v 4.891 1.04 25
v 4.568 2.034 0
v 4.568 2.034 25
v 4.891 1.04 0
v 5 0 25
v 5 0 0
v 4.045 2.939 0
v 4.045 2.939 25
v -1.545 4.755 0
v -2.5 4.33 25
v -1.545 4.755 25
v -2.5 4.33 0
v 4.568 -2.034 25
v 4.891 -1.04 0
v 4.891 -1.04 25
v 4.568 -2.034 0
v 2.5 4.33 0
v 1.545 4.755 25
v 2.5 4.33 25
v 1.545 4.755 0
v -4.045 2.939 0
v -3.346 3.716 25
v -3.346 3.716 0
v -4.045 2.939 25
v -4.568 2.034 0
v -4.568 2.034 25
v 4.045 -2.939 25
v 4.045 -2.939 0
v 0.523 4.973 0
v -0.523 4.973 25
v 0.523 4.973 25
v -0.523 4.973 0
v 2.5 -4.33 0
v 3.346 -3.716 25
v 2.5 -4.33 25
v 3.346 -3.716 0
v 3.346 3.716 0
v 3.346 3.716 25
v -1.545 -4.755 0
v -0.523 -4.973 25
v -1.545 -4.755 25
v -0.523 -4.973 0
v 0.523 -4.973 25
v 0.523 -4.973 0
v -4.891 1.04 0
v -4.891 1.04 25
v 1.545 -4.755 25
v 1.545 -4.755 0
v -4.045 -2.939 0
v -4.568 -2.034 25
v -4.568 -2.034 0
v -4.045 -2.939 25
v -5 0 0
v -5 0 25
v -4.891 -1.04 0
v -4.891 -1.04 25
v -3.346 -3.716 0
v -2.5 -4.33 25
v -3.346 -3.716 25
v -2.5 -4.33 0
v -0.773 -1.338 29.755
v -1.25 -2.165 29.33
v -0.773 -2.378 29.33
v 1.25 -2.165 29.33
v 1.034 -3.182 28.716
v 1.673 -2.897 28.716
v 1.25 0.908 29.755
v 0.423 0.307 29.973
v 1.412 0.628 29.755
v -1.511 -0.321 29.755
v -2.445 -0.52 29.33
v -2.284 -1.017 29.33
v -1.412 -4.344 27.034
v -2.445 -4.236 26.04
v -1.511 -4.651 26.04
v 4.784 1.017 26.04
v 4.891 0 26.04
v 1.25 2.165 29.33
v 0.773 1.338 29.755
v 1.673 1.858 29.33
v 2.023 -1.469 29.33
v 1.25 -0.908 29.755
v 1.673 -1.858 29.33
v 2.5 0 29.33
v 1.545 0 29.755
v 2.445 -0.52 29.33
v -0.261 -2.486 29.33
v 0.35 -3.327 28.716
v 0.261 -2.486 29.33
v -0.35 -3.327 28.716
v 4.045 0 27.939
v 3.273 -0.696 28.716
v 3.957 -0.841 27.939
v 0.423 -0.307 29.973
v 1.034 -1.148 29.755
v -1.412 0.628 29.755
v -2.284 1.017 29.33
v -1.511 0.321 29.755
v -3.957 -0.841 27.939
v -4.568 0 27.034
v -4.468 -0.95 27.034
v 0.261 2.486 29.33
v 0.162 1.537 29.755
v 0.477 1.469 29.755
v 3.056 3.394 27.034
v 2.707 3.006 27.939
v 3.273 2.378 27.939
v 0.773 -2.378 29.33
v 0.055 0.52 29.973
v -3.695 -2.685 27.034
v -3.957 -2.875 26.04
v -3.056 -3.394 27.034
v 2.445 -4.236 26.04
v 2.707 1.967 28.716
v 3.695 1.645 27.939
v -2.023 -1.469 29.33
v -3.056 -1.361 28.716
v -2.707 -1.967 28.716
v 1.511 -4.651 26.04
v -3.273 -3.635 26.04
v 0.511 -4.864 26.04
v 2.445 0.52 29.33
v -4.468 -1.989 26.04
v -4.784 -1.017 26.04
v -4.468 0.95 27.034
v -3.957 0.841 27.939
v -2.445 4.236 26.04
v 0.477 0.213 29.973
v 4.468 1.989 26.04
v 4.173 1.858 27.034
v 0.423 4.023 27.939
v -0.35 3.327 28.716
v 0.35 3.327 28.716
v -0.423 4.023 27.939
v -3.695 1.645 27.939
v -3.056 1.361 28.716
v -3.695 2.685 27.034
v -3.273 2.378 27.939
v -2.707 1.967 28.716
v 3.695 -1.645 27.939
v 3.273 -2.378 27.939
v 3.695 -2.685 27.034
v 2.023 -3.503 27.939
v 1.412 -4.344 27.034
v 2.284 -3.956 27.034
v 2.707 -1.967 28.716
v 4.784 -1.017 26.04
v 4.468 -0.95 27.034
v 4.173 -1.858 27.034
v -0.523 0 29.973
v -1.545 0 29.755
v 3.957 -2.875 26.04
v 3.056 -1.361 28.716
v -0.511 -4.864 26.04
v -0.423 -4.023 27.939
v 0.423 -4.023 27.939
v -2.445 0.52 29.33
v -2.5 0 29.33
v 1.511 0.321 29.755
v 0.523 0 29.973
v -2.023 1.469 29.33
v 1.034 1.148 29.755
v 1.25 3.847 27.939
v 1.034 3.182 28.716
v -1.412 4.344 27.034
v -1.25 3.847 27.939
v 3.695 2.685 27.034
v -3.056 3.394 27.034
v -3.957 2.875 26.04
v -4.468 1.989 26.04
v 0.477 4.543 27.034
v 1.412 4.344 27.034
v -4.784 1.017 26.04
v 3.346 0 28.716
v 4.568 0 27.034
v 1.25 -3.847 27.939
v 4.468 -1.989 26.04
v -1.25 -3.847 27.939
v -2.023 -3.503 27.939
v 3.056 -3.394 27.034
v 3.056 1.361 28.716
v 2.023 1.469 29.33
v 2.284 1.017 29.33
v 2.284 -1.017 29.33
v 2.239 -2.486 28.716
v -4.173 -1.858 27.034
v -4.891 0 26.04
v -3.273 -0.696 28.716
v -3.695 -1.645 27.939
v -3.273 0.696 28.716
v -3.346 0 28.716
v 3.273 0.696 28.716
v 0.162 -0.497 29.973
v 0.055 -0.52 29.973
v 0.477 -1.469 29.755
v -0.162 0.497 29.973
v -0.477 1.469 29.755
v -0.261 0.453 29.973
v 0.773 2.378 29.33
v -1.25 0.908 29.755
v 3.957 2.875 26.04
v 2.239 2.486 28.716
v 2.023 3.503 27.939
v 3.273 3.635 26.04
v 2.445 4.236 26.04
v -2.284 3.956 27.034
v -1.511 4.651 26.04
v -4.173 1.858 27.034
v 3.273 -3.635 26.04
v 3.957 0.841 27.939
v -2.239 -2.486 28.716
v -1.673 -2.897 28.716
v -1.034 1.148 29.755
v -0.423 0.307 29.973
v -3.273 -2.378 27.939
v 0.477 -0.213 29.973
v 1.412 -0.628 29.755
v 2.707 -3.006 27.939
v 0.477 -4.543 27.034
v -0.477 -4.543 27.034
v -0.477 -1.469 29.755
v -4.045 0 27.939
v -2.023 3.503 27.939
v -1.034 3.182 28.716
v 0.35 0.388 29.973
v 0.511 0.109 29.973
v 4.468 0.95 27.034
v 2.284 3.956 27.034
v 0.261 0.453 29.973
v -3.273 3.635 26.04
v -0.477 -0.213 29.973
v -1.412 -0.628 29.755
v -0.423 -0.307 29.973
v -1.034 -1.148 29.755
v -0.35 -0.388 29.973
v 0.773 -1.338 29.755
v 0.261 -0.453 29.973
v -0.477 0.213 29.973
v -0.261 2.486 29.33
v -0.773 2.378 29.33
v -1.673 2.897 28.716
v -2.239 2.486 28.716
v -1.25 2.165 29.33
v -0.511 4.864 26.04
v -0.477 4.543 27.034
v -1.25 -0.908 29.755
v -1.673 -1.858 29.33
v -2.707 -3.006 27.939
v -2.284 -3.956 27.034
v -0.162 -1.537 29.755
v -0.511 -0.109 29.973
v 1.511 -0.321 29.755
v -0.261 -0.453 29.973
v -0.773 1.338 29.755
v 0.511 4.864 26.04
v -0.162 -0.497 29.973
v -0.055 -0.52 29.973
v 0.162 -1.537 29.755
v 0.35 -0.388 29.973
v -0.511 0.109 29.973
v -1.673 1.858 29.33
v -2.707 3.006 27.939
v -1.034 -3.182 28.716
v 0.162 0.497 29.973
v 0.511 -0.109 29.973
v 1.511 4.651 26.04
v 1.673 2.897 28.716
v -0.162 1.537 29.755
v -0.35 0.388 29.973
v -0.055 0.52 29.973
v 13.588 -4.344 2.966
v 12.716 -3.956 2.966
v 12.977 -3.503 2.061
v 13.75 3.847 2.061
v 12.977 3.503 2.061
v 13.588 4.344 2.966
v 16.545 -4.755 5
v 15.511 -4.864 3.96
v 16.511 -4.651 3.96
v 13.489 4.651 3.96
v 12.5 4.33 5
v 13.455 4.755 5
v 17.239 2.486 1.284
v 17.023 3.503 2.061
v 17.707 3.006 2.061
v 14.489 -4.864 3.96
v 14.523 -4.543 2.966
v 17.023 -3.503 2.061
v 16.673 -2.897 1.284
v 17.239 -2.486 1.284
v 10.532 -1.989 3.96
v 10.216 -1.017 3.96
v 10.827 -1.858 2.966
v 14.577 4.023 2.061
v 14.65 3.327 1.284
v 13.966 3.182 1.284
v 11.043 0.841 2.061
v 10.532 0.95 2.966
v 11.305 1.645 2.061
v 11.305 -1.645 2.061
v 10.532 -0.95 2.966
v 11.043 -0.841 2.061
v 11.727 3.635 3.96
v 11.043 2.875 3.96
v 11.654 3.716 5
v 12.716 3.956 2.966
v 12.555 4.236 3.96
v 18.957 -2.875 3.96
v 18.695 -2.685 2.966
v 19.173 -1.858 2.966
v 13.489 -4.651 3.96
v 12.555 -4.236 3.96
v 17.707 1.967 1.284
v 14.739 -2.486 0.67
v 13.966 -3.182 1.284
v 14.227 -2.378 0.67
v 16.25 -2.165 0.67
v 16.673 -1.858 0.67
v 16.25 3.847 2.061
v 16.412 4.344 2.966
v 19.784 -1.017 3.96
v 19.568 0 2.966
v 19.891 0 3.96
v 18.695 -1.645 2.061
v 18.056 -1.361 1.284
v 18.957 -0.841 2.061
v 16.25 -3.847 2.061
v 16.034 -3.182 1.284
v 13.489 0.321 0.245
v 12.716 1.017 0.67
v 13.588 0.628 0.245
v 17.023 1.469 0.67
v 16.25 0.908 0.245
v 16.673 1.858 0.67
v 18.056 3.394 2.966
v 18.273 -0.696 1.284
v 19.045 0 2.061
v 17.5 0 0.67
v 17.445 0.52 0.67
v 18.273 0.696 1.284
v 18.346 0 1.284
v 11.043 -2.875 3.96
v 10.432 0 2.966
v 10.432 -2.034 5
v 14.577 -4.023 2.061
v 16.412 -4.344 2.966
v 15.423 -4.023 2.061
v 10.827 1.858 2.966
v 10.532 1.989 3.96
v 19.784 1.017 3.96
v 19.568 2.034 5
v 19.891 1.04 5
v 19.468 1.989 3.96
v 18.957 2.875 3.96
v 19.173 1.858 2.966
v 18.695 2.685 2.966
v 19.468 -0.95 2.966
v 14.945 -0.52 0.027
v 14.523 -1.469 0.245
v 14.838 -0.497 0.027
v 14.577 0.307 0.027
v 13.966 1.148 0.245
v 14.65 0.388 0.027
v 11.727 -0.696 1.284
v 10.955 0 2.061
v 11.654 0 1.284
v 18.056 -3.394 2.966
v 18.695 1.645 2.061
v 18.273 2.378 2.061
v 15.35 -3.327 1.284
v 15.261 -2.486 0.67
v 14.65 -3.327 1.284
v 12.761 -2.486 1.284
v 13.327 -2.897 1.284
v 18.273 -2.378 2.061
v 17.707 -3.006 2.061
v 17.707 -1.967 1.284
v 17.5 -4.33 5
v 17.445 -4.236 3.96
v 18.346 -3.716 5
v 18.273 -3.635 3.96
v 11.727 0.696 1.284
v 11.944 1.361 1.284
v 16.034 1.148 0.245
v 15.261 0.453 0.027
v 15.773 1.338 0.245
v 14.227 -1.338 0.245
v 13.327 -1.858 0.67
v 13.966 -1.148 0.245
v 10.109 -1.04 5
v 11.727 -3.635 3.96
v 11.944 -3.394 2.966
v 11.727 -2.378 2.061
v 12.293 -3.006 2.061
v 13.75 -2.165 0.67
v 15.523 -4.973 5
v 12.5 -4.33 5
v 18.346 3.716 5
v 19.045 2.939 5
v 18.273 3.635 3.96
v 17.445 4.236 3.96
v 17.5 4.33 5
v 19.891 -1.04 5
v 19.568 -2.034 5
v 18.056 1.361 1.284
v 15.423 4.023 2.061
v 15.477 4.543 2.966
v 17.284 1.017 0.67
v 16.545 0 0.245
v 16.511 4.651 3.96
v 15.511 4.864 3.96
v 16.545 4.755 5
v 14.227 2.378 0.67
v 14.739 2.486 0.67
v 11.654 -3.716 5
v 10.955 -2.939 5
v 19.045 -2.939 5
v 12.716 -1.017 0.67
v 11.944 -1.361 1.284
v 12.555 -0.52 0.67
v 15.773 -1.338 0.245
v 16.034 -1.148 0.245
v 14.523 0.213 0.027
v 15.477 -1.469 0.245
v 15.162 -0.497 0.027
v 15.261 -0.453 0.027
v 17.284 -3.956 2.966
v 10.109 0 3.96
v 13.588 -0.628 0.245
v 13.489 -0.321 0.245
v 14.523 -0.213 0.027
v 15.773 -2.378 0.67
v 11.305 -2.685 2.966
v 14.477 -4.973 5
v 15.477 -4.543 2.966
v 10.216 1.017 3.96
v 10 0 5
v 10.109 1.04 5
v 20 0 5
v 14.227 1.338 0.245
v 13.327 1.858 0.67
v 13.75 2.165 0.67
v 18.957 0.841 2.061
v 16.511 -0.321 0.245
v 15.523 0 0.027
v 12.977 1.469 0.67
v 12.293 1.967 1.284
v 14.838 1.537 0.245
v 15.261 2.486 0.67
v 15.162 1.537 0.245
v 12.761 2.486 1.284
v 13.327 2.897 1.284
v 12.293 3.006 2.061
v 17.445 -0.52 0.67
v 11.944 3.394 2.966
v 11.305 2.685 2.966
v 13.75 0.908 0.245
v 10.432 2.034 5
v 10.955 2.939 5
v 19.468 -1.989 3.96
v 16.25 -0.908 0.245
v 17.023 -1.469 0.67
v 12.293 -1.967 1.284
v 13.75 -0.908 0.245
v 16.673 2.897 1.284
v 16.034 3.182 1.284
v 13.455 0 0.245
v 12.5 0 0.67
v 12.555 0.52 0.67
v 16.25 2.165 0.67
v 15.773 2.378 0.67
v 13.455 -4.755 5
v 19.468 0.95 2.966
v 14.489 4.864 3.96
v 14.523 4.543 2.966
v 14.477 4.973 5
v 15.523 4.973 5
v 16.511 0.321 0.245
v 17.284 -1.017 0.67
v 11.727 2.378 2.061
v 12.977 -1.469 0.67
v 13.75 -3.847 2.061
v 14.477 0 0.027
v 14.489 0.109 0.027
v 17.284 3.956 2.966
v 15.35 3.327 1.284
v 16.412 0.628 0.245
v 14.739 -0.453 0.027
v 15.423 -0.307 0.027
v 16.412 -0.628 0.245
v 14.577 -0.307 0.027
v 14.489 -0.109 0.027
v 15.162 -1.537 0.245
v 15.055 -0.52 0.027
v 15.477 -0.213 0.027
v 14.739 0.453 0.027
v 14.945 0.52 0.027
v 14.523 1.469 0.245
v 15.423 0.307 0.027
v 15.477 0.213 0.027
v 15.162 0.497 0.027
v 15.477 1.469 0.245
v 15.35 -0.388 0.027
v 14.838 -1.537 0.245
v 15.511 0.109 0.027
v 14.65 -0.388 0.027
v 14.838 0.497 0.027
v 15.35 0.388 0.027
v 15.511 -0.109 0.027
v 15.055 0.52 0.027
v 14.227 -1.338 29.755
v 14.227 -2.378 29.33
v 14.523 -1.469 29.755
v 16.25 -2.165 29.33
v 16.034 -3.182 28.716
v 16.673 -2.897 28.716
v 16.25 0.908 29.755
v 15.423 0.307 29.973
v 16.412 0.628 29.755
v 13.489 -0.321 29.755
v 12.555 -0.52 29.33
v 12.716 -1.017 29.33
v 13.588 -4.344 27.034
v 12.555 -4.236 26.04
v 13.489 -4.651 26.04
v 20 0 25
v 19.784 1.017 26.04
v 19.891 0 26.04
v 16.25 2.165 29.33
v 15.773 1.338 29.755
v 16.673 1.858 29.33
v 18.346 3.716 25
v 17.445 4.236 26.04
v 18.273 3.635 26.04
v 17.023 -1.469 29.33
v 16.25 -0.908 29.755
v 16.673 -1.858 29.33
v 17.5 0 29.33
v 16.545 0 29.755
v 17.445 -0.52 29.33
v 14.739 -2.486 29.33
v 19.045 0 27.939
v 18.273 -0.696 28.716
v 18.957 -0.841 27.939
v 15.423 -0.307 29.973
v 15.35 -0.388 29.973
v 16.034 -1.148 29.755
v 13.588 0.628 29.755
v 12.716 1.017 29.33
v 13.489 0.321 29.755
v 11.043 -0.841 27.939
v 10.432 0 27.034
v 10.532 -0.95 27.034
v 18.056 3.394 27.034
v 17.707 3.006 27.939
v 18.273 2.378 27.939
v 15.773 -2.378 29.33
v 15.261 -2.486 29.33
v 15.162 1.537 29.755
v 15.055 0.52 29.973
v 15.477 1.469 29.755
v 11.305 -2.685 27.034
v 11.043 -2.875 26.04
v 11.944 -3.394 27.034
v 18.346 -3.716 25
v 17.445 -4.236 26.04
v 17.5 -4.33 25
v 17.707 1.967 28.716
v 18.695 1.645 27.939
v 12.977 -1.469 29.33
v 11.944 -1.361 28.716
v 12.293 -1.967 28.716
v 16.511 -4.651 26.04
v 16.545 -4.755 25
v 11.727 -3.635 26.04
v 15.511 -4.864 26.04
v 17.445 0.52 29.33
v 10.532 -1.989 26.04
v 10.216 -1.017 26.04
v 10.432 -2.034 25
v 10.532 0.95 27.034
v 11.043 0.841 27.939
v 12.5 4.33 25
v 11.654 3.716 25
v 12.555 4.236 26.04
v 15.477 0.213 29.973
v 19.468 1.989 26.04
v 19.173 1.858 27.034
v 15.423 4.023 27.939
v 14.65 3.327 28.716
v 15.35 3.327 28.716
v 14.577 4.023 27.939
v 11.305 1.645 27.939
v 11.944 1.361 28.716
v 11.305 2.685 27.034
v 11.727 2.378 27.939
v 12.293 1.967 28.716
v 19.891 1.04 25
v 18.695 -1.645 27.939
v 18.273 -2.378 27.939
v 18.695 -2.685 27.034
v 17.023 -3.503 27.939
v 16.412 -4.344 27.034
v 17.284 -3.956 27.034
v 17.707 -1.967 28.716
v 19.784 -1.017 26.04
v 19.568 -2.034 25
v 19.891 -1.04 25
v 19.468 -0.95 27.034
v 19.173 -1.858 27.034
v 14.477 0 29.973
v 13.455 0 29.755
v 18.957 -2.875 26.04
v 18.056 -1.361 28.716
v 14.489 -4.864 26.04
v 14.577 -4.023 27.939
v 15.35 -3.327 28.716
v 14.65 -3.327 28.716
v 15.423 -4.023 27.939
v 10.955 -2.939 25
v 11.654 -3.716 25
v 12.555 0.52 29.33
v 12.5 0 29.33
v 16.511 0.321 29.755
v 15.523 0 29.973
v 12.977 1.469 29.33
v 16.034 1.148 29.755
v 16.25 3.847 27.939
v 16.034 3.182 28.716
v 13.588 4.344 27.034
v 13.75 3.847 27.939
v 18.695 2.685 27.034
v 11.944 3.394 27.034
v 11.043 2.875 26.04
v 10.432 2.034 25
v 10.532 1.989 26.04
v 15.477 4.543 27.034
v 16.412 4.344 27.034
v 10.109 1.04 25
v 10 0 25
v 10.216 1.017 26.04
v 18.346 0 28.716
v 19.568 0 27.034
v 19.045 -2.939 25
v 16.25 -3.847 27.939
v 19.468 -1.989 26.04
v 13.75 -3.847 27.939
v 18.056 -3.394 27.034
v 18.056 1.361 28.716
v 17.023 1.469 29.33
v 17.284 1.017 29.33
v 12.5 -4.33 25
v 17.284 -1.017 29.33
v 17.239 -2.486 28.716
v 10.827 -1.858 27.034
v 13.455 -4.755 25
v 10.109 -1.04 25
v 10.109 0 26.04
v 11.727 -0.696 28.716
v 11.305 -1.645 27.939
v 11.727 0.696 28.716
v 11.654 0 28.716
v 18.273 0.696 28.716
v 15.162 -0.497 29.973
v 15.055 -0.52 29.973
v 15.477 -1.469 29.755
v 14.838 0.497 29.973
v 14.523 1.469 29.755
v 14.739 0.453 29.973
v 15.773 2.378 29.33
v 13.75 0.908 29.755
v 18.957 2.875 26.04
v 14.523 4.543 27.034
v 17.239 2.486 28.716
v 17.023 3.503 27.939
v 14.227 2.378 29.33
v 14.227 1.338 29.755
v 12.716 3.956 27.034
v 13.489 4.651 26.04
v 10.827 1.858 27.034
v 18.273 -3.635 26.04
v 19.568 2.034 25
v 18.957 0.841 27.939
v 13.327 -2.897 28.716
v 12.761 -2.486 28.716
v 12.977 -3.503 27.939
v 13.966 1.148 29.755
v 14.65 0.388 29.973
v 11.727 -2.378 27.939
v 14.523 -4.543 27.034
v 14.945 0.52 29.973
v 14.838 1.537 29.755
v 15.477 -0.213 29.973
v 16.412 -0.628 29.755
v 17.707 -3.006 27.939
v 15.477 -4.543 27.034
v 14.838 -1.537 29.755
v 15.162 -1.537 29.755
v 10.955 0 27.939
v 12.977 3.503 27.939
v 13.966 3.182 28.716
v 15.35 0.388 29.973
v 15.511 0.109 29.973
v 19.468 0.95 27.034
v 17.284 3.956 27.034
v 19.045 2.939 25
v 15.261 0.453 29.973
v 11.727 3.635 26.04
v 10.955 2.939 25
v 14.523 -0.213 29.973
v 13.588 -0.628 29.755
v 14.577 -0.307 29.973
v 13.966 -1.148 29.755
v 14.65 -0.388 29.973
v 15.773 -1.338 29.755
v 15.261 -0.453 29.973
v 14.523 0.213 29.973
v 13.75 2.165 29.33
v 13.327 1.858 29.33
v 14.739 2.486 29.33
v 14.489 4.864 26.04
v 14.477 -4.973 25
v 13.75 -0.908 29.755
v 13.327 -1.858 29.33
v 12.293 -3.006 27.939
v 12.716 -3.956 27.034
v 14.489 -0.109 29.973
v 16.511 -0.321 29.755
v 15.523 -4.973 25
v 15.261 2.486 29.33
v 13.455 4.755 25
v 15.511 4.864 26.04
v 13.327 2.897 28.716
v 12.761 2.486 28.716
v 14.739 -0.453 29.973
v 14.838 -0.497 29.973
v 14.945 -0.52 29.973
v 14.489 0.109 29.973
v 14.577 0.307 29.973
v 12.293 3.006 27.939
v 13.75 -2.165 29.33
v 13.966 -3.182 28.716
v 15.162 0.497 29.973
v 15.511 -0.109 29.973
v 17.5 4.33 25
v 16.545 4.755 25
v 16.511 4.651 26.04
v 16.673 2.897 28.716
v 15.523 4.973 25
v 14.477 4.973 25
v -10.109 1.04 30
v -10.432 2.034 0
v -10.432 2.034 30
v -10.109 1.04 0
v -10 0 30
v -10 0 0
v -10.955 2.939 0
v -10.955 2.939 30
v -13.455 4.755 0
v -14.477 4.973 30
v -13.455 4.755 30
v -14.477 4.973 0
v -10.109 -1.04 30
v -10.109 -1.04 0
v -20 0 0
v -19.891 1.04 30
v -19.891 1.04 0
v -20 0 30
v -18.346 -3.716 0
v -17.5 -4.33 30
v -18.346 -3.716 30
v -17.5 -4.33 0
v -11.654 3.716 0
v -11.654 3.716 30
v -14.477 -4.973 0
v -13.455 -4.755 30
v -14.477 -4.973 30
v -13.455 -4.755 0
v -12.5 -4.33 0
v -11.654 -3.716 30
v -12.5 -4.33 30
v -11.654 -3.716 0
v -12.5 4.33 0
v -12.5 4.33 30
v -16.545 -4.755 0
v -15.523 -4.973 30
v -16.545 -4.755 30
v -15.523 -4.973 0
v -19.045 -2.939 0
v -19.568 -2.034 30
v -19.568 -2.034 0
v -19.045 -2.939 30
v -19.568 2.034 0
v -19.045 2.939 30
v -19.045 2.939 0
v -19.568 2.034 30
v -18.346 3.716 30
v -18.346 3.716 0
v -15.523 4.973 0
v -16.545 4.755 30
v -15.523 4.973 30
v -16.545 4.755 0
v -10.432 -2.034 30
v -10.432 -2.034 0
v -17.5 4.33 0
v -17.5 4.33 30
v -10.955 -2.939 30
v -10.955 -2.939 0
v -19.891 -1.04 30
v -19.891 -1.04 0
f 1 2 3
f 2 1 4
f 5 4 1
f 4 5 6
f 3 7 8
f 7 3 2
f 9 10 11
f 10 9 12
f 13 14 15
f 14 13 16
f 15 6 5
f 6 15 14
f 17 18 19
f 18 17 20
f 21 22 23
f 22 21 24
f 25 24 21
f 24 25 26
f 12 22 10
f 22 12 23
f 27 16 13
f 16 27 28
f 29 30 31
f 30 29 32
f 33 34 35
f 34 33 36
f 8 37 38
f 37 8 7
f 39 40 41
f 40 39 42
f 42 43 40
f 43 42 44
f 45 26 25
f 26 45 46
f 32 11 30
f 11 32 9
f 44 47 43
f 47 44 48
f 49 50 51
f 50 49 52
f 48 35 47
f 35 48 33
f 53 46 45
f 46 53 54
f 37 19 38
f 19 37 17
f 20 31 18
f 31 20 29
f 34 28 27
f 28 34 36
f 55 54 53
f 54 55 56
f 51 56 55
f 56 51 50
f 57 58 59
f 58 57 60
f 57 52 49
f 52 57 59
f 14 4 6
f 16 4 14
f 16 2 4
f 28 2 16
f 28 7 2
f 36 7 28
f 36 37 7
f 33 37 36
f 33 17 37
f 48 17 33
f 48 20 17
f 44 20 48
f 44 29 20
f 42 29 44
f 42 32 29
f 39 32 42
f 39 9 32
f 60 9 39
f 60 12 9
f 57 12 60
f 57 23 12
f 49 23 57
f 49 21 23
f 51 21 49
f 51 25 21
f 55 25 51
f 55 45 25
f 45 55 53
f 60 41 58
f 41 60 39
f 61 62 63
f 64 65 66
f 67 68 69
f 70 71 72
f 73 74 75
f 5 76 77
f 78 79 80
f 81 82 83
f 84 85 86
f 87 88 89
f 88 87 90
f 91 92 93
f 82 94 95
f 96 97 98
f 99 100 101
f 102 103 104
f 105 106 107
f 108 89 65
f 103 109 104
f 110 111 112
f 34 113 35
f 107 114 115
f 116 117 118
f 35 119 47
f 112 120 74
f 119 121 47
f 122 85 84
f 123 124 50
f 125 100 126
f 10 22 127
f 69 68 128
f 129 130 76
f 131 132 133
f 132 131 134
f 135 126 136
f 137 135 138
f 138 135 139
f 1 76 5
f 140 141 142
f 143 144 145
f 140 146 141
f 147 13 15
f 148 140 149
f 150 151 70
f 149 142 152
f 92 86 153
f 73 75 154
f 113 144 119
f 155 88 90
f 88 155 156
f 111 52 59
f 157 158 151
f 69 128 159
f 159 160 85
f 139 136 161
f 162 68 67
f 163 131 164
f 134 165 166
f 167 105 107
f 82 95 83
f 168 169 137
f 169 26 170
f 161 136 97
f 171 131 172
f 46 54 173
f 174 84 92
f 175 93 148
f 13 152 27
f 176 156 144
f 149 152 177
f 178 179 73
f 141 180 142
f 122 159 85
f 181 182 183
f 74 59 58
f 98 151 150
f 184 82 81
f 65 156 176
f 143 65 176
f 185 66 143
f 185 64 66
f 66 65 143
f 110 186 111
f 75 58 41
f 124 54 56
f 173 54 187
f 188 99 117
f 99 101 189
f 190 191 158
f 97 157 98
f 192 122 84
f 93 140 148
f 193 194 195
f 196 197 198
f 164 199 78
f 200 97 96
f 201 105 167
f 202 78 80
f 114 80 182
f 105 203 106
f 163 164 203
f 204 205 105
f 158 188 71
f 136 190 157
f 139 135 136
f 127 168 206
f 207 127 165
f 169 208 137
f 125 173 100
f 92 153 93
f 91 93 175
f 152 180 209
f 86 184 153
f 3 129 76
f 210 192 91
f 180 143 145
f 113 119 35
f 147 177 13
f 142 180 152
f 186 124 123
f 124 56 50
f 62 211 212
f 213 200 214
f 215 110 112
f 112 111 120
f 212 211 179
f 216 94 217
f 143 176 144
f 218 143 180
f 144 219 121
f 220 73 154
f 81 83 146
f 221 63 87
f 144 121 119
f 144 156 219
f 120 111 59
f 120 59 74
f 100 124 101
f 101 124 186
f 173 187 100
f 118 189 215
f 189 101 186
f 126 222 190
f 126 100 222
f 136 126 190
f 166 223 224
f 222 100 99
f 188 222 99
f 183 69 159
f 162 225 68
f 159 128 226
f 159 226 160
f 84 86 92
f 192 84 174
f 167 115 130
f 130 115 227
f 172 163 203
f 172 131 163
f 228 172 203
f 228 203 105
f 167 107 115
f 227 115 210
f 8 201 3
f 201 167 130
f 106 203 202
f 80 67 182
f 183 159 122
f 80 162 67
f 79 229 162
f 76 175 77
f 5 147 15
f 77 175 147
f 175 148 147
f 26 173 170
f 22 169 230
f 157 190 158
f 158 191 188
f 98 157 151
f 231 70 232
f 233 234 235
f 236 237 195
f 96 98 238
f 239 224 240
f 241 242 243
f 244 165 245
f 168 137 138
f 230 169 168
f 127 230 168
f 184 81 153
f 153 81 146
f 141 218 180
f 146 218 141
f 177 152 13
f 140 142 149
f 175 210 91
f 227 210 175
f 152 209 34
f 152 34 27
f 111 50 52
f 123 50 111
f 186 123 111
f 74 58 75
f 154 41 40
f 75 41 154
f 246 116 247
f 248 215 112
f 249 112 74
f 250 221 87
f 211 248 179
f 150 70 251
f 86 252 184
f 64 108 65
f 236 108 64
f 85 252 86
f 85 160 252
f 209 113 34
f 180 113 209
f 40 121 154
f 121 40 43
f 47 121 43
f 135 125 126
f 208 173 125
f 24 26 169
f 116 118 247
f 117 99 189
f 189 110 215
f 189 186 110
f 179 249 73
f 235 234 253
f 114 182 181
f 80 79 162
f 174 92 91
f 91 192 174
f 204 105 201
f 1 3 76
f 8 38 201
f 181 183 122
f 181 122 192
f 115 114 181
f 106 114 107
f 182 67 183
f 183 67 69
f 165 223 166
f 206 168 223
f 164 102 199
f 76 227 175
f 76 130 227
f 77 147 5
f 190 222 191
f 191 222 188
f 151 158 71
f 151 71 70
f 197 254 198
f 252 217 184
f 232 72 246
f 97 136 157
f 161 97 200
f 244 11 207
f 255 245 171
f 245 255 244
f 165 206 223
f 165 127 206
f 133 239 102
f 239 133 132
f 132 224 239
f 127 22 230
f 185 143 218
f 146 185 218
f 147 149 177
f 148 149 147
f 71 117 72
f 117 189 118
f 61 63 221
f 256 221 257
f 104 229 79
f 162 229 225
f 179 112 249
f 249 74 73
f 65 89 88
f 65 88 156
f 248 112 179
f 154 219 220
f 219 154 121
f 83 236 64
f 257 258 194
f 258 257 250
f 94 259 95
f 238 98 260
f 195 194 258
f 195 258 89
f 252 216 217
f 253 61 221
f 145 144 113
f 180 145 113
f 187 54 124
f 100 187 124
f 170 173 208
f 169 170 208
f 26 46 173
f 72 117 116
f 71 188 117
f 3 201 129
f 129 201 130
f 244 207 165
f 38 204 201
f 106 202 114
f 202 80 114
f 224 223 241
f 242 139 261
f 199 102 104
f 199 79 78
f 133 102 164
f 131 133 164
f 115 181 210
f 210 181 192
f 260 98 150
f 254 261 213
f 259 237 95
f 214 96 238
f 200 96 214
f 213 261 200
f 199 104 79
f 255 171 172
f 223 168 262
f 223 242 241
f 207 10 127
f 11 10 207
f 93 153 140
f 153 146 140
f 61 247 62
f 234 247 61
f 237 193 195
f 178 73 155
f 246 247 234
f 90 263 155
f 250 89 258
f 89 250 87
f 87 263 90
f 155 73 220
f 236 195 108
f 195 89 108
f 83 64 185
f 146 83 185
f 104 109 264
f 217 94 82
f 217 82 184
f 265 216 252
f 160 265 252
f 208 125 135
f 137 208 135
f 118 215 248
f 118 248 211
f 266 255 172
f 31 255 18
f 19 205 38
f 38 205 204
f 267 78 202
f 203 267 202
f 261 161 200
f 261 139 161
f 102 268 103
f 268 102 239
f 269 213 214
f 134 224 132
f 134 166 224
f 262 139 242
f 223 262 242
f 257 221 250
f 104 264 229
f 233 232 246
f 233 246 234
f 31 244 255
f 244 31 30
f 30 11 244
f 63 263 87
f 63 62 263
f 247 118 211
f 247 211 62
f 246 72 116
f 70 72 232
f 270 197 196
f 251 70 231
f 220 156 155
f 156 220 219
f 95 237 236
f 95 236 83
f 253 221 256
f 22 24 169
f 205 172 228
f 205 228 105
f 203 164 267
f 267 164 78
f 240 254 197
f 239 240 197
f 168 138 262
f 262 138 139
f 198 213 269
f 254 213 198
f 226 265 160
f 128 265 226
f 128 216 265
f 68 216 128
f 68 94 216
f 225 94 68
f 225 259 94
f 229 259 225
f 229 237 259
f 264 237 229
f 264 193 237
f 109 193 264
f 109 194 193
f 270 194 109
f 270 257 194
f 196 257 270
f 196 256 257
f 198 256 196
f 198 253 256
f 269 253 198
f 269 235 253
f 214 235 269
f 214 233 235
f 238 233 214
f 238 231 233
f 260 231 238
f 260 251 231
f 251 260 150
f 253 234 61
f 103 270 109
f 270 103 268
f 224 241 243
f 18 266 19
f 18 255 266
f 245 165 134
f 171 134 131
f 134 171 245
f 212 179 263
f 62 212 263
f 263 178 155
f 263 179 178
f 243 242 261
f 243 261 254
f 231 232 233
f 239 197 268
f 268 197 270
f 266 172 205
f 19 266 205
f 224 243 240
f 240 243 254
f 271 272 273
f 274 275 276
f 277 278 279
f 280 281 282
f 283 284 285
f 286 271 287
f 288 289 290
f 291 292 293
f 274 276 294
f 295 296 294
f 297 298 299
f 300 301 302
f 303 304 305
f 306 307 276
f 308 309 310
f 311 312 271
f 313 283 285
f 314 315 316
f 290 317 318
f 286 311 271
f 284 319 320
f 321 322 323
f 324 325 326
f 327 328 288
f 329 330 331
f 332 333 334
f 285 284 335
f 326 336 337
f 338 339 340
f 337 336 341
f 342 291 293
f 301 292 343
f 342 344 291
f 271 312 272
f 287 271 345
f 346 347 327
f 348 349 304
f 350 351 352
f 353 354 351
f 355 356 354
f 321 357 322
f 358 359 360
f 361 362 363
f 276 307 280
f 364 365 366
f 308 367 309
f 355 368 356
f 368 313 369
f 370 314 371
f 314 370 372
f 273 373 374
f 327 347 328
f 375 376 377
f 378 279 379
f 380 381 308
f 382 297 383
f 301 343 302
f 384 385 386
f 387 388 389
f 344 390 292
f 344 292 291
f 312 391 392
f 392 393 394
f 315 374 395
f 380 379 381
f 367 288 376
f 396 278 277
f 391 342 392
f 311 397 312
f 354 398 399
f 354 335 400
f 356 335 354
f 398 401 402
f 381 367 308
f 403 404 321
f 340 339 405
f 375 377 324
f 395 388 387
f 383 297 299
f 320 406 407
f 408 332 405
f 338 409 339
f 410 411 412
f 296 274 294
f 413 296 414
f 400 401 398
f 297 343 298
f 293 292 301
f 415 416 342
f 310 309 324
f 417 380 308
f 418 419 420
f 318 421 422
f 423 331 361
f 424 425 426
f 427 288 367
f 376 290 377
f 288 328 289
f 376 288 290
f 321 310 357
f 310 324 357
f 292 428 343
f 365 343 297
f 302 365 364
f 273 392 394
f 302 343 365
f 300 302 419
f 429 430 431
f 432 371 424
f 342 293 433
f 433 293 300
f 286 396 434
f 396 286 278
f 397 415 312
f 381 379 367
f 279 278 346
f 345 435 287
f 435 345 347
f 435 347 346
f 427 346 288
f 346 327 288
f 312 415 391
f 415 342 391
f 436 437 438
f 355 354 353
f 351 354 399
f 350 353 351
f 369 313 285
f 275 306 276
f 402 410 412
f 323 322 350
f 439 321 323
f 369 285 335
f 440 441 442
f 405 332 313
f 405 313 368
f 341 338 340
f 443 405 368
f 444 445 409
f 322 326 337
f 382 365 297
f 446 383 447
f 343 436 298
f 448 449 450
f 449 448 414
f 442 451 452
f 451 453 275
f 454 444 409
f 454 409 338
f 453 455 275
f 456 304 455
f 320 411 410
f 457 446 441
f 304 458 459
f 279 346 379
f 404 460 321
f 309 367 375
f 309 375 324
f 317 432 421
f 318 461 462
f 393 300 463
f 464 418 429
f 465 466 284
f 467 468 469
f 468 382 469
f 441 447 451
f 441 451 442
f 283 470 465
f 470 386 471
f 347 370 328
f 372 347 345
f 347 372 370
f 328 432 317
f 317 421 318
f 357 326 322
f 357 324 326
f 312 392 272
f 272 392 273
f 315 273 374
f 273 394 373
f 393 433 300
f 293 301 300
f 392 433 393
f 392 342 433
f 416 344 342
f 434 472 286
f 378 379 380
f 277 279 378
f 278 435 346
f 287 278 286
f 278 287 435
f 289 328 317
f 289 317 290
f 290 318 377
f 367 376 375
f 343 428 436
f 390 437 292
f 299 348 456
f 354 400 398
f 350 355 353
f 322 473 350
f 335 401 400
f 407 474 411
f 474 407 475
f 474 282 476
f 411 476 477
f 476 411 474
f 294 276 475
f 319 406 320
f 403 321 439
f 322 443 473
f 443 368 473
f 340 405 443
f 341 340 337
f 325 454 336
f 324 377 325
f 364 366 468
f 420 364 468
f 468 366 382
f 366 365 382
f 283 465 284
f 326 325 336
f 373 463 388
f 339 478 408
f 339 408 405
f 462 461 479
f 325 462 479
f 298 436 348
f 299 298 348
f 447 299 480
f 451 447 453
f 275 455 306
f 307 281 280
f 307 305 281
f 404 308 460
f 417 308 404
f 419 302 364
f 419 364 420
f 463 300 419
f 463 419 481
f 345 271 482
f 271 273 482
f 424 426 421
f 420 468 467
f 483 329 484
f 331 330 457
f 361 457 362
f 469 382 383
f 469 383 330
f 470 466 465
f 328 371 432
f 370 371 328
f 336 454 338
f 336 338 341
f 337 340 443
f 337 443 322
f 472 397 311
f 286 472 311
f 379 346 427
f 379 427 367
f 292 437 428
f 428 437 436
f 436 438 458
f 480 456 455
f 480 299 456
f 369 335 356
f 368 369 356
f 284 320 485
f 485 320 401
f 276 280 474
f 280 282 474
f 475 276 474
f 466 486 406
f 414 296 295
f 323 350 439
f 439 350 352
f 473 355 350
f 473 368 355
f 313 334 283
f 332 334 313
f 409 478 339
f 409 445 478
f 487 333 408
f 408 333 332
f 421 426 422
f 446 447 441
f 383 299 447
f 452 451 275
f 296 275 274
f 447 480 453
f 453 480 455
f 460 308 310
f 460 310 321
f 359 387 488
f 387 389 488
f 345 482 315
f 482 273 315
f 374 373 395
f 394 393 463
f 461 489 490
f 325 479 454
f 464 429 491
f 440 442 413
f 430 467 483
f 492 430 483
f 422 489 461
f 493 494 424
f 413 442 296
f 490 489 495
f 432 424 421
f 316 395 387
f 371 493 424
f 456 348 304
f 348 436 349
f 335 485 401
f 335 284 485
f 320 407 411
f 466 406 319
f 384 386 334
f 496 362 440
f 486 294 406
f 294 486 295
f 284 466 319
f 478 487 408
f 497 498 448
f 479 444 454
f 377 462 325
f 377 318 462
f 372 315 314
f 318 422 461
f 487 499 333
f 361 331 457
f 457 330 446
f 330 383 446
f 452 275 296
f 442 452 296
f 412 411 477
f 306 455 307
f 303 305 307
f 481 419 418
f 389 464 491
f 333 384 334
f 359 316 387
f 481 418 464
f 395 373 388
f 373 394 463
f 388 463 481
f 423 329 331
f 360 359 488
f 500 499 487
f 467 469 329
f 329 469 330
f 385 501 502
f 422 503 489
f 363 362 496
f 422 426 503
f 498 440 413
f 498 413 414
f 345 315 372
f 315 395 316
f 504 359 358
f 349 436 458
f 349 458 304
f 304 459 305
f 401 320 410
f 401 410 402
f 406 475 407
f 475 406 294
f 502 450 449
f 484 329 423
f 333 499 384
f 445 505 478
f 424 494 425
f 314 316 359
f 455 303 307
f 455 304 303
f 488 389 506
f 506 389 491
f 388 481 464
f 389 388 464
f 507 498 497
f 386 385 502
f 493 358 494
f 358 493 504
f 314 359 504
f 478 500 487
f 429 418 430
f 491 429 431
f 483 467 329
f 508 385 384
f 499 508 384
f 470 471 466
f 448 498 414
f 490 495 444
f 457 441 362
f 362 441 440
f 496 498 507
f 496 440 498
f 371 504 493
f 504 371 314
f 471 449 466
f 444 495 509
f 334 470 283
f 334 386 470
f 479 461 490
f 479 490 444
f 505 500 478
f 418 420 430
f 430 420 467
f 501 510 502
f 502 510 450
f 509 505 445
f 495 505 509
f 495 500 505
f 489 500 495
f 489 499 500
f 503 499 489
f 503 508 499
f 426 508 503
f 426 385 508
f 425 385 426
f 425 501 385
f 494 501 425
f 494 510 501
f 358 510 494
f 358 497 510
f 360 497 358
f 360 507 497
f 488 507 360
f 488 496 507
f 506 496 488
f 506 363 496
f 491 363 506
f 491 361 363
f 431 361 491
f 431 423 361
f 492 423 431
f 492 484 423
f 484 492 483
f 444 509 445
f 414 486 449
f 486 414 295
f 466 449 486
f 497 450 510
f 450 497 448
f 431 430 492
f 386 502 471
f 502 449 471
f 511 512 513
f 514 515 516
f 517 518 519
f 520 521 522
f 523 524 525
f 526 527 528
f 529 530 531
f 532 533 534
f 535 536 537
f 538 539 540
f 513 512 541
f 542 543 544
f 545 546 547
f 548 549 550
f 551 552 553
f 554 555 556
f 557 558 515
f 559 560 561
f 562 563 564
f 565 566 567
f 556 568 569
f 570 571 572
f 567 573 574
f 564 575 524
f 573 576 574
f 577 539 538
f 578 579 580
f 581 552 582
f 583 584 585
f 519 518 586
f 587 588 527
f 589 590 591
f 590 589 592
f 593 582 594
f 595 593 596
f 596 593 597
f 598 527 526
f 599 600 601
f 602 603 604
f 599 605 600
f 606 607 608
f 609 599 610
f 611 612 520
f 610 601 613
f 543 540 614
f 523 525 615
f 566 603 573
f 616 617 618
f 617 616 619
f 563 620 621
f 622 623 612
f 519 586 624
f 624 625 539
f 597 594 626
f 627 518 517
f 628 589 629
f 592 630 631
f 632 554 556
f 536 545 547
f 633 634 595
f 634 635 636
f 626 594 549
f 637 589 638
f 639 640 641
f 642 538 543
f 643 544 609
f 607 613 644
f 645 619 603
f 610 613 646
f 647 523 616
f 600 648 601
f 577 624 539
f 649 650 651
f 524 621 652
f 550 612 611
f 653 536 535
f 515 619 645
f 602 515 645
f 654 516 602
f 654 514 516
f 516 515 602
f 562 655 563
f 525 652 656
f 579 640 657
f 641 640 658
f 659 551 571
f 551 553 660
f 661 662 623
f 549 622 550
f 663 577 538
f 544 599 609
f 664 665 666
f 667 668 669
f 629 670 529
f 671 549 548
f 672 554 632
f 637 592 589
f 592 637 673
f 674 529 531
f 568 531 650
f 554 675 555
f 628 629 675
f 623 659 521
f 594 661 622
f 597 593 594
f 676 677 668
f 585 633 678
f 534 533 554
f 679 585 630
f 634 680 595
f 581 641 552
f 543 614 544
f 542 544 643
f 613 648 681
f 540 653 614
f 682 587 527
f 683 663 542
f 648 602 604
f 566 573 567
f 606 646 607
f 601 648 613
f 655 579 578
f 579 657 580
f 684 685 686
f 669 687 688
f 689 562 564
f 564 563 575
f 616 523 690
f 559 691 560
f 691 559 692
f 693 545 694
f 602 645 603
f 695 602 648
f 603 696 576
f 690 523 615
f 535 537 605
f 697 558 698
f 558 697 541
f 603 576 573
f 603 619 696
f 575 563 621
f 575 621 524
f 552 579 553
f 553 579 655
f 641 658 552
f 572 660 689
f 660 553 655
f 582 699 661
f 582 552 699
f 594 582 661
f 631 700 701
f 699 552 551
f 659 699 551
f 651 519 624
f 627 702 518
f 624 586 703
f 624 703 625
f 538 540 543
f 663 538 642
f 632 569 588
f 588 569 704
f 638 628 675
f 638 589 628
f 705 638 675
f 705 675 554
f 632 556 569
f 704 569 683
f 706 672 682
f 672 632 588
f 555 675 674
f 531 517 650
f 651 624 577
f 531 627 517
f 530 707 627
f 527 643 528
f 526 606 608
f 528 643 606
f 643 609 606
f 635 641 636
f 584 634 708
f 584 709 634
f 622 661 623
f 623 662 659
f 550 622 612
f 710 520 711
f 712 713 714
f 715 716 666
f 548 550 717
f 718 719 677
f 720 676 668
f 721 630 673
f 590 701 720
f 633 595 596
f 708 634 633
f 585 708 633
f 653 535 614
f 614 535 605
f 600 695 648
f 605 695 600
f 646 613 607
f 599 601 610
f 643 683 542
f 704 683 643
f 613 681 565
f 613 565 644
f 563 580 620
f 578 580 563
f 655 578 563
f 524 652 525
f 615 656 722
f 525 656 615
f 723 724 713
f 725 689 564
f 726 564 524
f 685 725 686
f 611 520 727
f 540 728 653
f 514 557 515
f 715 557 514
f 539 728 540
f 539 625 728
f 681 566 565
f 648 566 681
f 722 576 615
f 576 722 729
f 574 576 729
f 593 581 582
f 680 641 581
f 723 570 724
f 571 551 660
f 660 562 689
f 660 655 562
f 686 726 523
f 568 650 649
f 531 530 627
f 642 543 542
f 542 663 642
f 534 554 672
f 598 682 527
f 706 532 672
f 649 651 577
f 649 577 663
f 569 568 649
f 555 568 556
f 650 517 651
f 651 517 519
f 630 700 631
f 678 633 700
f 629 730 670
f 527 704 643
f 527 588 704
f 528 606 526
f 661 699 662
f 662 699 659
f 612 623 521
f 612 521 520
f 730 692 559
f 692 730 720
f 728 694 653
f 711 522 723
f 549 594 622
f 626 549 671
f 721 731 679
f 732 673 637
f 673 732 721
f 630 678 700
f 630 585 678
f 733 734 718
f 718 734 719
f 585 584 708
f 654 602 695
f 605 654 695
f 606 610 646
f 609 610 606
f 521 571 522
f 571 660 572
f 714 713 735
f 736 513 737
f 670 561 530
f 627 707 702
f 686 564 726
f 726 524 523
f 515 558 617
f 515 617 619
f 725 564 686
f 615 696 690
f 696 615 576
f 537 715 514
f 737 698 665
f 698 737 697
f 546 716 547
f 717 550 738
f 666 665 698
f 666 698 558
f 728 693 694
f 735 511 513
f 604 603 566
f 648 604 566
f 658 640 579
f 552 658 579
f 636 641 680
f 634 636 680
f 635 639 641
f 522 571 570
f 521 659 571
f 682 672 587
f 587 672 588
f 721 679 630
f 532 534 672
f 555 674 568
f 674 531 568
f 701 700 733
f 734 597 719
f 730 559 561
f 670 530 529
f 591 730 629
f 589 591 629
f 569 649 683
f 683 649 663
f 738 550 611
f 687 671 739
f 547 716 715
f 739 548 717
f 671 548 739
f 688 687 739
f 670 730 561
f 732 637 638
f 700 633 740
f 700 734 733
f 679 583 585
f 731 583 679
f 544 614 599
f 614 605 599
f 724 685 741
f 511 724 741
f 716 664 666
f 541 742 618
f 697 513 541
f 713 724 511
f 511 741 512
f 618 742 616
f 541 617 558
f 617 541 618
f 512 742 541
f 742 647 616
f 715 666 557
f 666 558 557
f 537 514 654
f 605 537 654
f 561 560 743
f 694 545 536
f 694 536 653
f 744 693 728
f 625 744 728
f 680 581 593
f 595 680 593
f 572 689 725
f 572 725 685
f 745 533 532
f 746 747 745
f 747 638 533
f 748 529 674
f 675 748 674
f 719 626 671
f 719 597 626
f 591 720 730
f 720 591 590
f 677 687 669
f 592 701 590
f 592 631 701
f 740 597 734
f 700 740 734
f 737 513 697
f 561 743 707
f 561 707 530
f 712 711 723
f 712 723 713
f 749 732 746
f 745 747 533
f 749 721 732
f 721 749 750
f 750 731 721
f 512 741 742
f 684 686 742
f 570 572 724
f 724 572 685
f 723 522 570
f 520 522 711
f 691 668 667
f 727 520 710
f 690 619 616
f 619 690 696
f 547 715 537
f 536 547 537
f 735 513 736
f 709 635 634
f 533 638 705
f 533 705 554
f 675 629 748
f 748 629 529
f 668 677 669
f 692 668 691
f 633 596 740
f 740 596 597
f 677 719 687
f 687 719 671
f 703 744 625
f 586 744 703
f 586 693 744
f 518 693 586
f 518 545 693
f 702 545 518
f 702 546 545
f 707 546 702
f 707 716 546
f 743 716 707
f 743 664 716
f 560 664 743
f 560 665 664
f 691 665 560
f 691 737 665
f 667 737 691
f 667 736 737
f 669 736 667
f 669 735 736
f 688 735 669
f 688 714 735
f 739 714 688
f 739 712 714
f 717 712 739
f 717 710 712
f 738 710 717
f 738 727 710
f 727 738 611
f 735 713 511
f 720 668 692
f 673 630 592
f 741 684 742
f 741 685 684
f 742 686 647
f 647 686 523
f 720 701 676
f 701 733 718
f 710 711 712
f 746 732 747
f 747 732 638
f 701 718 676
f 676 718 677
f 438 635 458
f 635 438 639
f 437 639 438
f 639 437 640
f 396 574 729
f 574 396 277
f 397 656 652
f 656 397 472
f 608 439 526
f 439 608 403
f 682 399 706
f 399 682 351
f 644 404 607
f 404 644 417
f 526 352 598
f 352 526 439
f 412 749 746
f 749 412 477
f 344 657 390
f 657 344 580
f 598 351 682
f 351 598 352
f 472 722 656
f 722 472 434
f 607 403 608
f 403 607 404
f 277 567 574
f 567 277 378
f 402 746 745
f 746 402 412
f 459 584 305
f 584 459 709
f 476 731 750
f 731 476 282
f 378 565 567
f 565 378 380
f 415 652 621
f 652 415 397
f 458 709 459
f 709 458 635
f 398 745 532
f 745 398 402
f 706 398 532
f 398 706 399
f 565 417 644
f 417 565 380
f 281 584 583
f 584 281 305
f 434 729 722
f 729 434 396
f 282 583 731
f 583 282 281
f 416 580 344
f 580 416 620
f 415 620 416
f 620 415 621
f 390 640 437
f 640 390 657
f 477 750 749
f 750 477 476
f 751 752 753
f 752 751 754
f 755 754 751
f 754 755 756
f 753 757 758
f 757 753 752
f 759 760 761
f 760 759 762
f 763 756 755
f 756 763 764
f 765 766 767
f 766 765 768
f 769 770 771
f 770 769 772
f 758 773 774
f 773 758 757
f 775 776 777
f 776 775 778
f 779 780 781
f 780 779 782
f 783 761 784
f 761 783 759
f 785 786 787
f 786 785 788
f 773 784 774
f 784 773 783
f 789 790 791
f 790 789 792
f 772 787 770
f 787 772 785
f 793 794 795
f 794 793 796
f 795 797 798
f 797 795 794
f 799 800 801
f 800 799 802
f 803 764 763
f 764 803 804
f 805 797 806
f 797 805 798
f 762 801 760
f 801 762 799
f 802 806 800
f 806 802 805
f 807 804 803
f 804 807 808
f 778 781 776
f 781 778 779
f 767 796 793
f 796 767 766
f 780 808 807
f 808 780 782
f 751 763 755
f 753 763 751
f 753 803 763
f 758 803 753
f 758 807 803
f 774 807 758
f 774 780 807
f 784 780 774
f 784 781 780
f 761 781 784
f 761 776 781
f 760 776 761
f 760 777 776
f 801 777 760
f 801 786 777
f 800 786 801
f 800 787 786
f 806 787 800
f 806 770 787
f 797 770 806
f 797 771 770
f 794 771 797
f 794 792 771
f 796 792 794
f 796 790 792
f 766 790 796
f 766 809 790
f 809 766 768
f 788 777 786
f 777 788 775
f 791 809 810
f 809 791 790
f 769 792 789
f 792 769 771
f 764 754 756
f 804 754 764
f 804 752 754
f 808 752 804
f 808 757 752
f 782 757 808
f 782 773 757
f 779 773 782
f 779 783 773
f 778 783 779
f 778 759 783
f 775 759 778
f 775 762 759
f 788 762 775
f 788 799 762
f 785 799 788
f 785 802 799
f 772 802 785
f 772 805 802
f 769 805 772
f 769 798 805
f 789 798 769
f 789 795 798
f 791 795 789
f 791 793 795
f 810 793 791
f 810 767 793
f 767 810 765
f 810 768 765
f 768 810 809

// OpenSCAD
//-- Cilindro redondeado en las tapas
module rcylinder(
    r=4,
    h=20,
    center=false,
    both=false,
    $fn=30,
){
    //-- Calcular altura cilindro interior:
    //-- 2 tapas: h-2*r
    //-- 1 tapa: h-r
    hc=(both==true) ? h-2*r : h-r;

    //-- Calcular traslación para centrar el cilindro
    posc=(center==true) ? 0 : h/2;

    //-- Aplicar traslación para el centrado
    translate([0,0,posc]){
        if(both==true){
            //-- Cilindro con ambas tapas redondeadas
            cylinder(r=r,h=hc,center=true,$fn=$fn);
            //-- Esferas
            for(i=[-1,1])
                translate([0,0,i*hc/2])
                    sphere(r=r);
        }else{
            //-- Cilindro con una tapa redondeada
            translate([0,0,-h/2]){
                cylinder(r=r,h=hc,$fn=$fn);
                translate([0,0,hc])
                    sphere(r=r,$fn=$fn);
            }
        }
    }
}

//-- Ejemplos
r=5;
h=30;
center=false;
$fn=30;

//-- Cilindro normal
translate([-3*r,0,0])
    cylinder(r=r,h=h,center=center,$fn=$fn);

//-- Cilindro con tapa superior redondeada
rcylinder(r=r,h=h,both=false,center=center,$fn=$fn);

//-- Cilindro con ambas tapas redondeadas
translate([3*r,0,0])
    rcylinder(r=r,h=h,both=true,center=center,$fn=$fn);
